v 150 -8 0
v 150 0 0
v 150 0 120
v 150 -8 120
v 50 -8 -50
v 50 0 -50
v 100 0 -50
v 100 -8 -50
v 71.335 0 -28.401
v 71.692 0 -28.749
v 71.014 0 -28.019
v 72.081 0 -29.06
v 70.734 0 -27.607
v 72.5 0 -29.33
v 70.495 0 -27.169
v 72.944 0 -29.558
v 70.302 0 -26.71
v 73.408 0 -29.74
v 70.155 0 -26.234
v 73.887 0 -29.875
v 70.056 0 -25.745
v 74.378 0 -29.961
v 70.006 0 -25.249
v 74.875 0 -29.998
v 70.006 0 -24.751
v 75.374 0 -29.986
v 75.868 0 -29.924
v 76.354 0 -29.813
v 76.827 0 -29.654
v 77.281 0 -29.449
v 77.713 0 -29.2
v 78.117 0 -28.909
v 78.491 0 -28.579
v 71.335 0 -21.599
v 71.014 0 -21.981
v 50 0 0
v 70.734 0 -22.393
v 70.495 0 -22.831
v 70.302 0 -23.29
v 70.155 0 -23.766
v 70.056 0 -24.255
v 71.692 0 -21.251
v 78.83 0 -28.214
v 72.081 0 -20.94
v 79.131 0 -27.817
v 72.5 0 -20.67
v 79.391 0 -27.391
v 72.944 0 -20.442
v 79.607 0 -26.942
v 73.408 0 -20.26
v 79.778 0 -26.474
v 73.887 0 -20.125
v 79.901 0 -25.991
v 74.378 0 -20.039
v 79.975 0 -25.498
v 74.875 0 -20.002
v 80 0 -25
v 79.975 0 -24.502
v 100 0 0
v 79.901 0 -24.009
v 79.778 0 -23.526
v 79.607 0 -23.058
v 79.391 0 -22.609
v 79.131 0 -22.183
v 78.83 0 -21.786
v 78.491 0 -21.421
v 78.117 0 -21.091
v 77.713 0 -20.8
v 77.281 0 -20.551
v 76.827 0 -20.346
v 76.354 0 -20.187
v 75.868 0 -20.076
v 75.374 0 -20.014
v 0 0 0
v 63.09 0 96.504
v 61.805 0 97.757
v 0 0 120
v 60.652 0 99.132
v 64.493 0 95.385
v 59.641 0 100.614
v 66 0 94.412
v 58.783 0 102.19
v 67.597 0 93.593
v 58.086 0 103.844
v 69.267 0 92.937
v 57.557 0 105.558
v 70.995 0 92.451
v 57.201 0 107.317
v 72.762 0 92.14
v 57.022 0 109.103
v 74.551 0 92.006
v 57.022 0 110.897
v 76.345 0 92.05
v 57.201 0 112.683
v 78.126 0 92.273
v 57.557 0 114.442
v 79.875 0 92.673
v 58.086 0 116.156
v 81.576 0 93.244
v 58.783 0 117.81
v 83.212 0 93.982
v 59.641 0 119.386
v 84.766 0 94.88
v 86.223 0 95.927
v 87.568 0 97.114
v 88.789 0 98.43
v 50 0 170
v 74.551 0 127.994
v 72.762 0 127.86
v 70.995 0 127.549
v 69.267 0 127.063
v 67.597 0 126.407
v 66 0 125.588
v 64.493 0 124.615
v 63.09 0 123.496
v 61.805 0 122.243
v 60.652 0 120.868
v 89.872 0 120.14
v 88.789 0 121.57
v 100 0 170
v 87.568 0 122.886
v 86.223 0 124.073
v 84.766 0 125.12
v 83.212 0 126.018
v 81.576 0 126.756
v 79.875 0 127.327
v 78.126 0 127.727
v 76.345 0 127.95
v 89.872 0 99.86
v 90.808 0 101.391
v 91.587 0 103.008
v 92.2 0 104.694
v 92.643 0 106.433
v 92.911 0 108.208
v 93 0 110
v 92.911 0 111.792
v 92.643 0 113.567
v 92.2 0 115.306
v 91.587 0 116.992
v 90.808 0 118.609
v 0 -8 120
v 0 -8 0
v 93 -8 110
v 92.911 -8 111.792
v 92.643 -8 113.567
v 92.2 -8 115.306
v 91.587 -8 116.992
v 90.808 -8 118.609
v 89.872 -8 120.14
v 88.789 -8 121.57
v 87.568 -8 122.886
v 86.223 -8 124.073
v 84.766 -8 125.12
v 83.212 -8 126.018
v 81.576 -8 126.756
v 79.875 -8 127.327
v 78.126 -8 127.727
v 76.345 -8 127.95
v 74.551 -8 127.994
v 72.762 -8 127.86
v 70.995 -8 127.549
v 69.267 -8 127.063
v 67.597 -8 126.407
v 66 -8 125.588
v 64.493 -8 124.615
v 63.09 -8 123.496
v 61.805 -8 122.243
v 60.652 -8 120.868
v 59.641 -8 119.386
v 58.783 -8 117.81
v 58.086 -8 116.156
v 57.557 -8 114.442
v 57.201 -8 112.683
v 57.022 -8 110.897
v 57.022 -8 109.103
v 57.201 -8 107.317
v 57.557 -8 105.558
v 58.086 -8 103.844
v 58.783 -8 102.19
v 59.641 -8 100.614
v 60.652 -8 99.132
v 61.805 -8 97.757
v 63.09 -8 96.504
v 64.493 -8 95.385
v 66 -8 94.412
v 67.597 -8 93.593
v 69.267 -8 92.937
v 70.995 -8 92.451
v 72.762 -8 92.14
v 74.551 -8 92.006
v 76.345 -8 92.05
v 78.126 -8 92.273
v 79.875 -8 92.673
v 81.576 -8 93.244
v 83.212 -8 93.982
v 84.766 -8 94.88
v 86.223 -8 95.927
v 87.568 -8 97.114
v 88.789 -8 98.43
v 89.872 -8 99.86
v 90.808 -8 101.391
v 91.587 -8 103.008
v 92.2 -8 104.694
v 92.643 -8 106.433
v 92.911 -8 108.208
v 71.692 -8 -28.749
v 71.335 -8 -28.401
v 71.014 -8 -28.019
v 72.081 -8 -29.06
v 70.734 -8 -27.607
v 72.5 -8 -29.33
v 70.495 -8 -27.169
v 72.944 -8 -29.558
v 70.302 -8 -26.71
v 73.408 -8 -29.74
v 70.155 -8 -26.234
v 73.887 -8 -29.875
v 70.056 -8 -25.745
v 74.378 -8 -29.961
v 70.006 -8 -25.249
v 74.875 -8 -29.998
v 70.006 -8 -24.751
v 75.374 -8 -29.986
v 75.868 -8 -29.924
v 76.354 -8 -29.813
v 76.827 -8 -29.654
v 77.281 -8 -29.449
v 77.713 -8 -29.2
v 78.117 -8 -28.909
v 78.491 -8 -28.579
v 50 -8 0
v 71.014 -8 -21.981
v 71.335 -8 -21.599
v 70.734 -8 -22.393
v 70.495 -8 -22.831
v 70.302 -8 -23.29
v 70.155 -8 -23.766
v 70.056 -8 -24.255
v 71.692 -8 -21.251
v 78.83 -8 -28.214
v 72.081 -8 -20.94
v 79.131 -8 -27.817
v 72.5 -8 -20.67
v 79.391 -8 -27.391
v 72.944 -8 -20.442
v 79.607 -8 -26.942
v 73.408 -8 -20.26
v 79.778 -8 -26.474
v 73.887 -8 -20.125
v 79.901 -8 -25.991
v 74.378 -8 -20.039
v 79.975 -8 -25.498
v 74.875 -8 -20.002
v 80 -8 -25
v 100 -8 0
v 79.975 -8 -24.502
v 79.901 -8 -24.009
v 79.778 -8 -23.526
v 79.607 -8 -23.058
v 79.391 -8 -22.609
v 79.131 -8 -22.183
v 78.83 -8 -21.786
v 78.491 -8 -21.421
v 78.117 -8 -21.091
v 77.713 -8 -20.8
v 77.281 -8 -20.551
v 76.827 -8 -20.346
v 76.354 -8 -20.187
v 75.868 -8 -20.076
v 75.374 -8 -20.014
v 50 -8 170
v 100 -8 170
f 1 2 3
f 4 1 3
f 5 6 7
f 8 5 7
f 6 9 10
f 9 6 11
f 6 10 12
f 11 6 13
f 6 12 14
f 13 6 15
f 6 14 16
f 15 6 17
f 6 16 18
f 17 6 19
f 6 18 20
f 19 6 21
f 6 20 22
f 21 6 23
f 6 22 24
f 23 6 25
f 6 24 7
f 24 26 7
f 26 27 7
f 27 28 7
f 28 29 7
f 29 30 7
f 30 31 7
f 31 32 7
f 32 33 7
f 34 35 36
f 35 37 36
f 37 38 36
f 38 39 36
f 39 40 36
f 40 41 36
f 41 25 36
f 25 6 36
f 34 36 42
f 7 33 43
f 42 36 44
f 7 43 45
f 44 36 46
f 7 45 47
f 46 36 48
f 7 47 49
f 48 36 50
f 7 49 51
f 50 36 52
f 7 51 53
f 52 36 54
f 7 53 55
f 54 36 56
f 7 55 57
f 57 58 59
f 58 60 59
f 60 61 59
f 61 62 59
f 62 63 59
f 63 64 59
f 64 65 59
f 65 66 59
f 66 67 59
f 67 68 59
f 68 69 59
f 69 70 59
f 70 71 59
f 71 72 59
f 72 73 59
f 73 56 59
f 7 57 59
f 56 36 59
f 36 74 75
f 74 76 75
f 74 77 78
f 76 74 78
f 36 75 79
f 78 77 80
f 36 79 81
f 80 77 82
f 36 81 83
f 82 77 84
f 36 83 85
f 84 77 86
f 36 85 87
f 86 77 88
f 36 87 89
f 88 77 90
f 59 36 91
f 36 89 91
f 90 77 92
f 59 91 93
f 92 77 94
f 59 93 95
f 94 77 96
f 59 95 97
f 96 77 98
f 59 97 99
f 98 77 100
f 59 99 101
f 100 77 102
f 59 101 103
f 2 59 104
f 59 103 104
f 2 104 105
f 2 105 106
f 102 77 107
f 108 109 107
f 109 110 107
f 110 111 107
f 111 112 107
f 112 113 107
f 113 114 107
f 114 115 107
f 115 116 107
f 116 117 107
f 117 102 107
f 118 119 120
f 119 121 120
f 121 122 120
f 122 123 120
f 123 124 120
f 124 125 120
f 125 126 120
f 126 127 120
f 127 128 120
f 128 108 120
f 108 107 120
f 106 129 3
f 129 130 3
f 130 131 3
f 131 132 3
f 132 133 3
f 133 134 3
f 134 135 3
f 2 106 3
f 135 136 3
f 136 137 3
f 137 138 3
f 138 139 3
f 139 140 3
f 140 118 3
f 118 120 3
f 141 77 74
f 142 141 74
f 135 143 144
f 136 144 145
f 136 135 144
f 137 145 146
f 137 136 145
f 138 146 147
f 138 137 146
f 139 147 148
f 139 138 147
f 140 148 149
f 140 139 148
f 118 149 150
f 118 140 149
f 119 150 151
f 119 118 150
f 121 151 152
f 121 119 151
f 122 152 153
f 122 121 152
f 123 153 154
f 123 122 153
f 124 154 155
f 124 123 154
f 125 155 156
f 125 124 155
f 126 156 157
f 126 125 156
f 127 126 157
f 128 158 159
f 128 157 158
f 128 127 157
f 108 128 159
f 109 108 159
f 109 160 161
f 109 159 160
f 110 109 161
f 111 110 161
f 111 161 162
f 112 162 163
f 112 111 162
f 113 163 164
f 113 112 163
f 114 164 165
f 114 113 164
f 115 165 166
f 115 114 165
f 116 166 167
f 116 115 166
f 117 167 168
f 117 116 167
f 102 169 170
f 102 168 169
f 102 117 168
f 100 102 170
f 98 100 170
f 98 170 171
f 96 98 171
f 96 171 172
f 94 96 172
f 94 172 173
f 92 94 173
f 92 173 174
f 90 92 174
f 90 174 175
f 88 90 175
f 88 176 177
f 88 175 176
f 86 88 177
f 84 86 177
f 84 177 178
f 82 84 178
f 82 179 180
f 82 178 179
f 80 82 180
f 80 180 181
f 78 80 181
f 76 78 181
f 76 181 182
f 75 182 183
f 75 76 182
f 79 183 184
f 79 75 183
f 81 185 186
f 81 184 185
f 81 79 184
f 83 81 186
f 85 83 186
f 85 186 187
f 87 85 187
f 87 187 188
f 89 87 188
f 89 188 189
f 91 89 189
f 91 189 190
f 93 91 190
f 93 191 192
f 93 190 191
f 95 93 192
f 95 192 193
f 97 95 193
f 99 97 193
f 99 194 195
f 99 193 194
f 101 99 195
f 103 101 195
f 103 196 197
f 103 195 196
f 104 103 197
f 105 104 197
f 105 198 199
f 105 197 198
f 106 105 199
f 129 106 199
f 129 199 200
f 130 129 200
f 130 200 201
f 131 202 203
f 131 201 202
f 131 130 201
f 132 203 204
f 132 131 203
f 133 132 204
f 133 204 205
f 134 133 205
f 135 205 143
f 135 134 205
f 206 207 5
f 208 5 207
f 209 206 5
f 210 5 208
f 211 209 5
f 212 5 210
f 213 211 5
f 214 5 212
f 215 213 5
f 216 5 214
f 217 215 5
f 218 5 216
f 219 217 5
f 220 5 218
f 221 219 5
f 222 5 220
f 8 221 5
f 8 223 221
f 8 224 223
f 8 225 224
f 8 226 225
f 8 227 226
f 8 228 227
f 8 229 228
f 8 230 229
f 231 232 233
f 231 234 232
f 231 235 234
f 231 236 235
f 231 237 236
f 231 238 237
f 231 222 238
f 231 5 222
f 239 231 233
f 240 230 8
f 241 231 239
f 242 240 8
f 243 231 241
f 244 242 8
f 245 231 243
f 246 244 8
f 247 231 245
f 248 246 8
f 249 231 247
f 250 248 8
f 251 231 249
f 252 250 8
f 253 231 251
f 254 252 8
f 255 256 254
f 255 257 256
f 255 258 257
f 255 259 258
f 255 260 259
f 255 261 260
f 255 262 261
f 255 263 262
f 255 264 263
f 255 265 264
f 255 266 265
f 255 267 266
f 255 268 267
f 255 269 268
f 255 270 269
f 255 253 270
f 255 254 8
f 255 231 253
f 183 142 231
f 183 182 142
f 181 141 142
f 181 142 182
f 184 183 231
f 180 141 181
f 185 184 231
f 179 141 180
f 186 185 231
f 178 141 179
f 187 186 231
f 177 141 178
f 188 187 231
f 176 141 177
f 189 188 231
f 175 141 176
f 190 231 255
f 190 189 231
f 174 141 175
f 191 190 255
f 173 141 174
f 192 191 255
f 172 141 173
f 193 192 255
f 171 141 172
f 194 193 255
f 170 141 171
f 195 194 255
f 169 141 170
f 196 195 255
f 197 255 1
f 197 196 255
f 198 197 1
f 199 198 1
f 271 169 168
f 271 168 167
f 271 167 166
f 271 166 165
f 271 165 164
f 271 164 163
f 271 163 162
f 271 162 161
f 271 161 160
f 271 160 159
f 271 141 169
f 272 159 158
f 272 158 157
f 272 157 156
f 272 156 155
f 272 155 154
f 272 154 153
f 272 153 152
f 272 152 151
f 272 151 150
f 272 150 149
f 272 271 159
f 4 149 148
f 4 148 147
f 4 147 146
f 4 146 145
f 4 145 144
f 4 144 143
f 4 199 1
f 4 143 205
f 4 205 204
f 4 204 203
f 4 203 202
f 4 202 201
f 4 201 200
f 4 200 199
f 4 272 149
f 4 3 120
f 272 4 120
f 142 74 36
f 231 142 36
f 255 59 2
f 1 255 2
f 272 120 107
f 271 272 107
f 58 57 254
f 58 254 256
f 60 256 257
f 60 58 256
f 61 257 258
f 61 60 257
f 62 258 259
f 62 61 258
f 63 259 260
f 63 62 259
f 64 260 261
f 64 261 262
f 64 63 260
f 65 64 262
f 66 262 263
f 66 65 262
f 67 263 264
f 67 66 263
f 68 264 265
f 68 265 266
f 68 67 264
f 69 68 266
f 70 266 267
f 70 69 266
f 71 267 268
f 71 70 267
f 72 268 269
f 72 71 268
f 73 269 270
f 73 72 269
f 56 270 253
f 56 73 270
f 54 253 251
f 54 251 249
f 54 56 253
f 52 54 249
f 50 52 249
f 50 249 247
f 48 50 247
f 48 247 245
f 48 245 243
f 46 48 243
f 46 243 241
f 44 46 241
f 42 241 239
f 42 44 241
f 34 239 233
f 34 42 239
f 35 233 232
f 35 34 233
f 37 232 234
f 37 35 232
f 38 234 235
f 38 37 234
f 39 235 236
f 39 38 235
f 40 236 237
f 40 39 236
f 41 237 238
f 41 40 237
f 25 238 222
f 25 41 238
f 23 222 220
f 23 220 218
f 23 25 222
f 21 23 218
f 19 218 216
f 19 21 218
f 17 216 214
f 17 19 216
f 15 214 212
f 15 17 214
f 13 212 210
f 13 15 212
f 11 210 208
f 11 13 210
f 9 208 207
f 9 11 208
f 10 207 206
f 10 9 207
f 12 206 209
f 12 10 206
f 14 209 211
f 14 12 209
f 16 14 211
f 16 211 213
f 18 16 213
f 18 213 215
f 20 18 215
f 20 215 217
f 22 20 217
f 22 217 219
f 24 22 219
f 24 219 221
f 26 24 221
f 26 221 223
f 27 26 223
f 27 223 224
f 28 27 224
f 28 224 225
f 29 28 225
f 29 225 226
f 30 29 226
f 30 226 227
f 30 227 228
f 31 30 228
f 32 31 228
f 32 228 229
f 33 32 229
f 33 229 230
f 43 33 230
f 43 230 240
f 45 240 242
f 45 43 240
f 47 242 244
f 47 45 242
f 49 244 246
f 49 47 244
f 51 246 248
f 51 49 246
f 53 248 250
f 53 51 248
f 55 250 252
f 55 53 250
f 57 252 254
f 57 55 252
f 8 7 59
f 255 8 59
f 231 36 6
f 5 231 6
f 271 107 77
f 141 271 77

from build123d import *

# Parameters (mm, degrees)
SKETCH_R     = 5
PAD_DEPTH    = 8
SKETCH001_R  = 18
POCKET_DEPTH = 8.001


with BuildPart() as part:
    # Sketch → Pad (new body)
    with BuildSketch(Plane.XZ):
        Polygon((0, 0), (50, 0), (50, -50), (100, -50), (100, 0), (150, 0), (150, 120), (100, 170), (50, 170), (0, 120), align=None)
        with Locations((75, -25)):
            Circle(SKETCH_R, mode=Mode.SUBTRACT)
    extrude(amount=PAD_DEPTH)

    # Sketch001 → Pocket (cut, through all)
    with BuildSketch(Plane.XZ):
        with Locations((75, 110)):
            Circle(SKETCH001_R)
    extrude(amount=POCKET_DEPTH, mode=Mode.SUBTRACT)


solid = part.part
